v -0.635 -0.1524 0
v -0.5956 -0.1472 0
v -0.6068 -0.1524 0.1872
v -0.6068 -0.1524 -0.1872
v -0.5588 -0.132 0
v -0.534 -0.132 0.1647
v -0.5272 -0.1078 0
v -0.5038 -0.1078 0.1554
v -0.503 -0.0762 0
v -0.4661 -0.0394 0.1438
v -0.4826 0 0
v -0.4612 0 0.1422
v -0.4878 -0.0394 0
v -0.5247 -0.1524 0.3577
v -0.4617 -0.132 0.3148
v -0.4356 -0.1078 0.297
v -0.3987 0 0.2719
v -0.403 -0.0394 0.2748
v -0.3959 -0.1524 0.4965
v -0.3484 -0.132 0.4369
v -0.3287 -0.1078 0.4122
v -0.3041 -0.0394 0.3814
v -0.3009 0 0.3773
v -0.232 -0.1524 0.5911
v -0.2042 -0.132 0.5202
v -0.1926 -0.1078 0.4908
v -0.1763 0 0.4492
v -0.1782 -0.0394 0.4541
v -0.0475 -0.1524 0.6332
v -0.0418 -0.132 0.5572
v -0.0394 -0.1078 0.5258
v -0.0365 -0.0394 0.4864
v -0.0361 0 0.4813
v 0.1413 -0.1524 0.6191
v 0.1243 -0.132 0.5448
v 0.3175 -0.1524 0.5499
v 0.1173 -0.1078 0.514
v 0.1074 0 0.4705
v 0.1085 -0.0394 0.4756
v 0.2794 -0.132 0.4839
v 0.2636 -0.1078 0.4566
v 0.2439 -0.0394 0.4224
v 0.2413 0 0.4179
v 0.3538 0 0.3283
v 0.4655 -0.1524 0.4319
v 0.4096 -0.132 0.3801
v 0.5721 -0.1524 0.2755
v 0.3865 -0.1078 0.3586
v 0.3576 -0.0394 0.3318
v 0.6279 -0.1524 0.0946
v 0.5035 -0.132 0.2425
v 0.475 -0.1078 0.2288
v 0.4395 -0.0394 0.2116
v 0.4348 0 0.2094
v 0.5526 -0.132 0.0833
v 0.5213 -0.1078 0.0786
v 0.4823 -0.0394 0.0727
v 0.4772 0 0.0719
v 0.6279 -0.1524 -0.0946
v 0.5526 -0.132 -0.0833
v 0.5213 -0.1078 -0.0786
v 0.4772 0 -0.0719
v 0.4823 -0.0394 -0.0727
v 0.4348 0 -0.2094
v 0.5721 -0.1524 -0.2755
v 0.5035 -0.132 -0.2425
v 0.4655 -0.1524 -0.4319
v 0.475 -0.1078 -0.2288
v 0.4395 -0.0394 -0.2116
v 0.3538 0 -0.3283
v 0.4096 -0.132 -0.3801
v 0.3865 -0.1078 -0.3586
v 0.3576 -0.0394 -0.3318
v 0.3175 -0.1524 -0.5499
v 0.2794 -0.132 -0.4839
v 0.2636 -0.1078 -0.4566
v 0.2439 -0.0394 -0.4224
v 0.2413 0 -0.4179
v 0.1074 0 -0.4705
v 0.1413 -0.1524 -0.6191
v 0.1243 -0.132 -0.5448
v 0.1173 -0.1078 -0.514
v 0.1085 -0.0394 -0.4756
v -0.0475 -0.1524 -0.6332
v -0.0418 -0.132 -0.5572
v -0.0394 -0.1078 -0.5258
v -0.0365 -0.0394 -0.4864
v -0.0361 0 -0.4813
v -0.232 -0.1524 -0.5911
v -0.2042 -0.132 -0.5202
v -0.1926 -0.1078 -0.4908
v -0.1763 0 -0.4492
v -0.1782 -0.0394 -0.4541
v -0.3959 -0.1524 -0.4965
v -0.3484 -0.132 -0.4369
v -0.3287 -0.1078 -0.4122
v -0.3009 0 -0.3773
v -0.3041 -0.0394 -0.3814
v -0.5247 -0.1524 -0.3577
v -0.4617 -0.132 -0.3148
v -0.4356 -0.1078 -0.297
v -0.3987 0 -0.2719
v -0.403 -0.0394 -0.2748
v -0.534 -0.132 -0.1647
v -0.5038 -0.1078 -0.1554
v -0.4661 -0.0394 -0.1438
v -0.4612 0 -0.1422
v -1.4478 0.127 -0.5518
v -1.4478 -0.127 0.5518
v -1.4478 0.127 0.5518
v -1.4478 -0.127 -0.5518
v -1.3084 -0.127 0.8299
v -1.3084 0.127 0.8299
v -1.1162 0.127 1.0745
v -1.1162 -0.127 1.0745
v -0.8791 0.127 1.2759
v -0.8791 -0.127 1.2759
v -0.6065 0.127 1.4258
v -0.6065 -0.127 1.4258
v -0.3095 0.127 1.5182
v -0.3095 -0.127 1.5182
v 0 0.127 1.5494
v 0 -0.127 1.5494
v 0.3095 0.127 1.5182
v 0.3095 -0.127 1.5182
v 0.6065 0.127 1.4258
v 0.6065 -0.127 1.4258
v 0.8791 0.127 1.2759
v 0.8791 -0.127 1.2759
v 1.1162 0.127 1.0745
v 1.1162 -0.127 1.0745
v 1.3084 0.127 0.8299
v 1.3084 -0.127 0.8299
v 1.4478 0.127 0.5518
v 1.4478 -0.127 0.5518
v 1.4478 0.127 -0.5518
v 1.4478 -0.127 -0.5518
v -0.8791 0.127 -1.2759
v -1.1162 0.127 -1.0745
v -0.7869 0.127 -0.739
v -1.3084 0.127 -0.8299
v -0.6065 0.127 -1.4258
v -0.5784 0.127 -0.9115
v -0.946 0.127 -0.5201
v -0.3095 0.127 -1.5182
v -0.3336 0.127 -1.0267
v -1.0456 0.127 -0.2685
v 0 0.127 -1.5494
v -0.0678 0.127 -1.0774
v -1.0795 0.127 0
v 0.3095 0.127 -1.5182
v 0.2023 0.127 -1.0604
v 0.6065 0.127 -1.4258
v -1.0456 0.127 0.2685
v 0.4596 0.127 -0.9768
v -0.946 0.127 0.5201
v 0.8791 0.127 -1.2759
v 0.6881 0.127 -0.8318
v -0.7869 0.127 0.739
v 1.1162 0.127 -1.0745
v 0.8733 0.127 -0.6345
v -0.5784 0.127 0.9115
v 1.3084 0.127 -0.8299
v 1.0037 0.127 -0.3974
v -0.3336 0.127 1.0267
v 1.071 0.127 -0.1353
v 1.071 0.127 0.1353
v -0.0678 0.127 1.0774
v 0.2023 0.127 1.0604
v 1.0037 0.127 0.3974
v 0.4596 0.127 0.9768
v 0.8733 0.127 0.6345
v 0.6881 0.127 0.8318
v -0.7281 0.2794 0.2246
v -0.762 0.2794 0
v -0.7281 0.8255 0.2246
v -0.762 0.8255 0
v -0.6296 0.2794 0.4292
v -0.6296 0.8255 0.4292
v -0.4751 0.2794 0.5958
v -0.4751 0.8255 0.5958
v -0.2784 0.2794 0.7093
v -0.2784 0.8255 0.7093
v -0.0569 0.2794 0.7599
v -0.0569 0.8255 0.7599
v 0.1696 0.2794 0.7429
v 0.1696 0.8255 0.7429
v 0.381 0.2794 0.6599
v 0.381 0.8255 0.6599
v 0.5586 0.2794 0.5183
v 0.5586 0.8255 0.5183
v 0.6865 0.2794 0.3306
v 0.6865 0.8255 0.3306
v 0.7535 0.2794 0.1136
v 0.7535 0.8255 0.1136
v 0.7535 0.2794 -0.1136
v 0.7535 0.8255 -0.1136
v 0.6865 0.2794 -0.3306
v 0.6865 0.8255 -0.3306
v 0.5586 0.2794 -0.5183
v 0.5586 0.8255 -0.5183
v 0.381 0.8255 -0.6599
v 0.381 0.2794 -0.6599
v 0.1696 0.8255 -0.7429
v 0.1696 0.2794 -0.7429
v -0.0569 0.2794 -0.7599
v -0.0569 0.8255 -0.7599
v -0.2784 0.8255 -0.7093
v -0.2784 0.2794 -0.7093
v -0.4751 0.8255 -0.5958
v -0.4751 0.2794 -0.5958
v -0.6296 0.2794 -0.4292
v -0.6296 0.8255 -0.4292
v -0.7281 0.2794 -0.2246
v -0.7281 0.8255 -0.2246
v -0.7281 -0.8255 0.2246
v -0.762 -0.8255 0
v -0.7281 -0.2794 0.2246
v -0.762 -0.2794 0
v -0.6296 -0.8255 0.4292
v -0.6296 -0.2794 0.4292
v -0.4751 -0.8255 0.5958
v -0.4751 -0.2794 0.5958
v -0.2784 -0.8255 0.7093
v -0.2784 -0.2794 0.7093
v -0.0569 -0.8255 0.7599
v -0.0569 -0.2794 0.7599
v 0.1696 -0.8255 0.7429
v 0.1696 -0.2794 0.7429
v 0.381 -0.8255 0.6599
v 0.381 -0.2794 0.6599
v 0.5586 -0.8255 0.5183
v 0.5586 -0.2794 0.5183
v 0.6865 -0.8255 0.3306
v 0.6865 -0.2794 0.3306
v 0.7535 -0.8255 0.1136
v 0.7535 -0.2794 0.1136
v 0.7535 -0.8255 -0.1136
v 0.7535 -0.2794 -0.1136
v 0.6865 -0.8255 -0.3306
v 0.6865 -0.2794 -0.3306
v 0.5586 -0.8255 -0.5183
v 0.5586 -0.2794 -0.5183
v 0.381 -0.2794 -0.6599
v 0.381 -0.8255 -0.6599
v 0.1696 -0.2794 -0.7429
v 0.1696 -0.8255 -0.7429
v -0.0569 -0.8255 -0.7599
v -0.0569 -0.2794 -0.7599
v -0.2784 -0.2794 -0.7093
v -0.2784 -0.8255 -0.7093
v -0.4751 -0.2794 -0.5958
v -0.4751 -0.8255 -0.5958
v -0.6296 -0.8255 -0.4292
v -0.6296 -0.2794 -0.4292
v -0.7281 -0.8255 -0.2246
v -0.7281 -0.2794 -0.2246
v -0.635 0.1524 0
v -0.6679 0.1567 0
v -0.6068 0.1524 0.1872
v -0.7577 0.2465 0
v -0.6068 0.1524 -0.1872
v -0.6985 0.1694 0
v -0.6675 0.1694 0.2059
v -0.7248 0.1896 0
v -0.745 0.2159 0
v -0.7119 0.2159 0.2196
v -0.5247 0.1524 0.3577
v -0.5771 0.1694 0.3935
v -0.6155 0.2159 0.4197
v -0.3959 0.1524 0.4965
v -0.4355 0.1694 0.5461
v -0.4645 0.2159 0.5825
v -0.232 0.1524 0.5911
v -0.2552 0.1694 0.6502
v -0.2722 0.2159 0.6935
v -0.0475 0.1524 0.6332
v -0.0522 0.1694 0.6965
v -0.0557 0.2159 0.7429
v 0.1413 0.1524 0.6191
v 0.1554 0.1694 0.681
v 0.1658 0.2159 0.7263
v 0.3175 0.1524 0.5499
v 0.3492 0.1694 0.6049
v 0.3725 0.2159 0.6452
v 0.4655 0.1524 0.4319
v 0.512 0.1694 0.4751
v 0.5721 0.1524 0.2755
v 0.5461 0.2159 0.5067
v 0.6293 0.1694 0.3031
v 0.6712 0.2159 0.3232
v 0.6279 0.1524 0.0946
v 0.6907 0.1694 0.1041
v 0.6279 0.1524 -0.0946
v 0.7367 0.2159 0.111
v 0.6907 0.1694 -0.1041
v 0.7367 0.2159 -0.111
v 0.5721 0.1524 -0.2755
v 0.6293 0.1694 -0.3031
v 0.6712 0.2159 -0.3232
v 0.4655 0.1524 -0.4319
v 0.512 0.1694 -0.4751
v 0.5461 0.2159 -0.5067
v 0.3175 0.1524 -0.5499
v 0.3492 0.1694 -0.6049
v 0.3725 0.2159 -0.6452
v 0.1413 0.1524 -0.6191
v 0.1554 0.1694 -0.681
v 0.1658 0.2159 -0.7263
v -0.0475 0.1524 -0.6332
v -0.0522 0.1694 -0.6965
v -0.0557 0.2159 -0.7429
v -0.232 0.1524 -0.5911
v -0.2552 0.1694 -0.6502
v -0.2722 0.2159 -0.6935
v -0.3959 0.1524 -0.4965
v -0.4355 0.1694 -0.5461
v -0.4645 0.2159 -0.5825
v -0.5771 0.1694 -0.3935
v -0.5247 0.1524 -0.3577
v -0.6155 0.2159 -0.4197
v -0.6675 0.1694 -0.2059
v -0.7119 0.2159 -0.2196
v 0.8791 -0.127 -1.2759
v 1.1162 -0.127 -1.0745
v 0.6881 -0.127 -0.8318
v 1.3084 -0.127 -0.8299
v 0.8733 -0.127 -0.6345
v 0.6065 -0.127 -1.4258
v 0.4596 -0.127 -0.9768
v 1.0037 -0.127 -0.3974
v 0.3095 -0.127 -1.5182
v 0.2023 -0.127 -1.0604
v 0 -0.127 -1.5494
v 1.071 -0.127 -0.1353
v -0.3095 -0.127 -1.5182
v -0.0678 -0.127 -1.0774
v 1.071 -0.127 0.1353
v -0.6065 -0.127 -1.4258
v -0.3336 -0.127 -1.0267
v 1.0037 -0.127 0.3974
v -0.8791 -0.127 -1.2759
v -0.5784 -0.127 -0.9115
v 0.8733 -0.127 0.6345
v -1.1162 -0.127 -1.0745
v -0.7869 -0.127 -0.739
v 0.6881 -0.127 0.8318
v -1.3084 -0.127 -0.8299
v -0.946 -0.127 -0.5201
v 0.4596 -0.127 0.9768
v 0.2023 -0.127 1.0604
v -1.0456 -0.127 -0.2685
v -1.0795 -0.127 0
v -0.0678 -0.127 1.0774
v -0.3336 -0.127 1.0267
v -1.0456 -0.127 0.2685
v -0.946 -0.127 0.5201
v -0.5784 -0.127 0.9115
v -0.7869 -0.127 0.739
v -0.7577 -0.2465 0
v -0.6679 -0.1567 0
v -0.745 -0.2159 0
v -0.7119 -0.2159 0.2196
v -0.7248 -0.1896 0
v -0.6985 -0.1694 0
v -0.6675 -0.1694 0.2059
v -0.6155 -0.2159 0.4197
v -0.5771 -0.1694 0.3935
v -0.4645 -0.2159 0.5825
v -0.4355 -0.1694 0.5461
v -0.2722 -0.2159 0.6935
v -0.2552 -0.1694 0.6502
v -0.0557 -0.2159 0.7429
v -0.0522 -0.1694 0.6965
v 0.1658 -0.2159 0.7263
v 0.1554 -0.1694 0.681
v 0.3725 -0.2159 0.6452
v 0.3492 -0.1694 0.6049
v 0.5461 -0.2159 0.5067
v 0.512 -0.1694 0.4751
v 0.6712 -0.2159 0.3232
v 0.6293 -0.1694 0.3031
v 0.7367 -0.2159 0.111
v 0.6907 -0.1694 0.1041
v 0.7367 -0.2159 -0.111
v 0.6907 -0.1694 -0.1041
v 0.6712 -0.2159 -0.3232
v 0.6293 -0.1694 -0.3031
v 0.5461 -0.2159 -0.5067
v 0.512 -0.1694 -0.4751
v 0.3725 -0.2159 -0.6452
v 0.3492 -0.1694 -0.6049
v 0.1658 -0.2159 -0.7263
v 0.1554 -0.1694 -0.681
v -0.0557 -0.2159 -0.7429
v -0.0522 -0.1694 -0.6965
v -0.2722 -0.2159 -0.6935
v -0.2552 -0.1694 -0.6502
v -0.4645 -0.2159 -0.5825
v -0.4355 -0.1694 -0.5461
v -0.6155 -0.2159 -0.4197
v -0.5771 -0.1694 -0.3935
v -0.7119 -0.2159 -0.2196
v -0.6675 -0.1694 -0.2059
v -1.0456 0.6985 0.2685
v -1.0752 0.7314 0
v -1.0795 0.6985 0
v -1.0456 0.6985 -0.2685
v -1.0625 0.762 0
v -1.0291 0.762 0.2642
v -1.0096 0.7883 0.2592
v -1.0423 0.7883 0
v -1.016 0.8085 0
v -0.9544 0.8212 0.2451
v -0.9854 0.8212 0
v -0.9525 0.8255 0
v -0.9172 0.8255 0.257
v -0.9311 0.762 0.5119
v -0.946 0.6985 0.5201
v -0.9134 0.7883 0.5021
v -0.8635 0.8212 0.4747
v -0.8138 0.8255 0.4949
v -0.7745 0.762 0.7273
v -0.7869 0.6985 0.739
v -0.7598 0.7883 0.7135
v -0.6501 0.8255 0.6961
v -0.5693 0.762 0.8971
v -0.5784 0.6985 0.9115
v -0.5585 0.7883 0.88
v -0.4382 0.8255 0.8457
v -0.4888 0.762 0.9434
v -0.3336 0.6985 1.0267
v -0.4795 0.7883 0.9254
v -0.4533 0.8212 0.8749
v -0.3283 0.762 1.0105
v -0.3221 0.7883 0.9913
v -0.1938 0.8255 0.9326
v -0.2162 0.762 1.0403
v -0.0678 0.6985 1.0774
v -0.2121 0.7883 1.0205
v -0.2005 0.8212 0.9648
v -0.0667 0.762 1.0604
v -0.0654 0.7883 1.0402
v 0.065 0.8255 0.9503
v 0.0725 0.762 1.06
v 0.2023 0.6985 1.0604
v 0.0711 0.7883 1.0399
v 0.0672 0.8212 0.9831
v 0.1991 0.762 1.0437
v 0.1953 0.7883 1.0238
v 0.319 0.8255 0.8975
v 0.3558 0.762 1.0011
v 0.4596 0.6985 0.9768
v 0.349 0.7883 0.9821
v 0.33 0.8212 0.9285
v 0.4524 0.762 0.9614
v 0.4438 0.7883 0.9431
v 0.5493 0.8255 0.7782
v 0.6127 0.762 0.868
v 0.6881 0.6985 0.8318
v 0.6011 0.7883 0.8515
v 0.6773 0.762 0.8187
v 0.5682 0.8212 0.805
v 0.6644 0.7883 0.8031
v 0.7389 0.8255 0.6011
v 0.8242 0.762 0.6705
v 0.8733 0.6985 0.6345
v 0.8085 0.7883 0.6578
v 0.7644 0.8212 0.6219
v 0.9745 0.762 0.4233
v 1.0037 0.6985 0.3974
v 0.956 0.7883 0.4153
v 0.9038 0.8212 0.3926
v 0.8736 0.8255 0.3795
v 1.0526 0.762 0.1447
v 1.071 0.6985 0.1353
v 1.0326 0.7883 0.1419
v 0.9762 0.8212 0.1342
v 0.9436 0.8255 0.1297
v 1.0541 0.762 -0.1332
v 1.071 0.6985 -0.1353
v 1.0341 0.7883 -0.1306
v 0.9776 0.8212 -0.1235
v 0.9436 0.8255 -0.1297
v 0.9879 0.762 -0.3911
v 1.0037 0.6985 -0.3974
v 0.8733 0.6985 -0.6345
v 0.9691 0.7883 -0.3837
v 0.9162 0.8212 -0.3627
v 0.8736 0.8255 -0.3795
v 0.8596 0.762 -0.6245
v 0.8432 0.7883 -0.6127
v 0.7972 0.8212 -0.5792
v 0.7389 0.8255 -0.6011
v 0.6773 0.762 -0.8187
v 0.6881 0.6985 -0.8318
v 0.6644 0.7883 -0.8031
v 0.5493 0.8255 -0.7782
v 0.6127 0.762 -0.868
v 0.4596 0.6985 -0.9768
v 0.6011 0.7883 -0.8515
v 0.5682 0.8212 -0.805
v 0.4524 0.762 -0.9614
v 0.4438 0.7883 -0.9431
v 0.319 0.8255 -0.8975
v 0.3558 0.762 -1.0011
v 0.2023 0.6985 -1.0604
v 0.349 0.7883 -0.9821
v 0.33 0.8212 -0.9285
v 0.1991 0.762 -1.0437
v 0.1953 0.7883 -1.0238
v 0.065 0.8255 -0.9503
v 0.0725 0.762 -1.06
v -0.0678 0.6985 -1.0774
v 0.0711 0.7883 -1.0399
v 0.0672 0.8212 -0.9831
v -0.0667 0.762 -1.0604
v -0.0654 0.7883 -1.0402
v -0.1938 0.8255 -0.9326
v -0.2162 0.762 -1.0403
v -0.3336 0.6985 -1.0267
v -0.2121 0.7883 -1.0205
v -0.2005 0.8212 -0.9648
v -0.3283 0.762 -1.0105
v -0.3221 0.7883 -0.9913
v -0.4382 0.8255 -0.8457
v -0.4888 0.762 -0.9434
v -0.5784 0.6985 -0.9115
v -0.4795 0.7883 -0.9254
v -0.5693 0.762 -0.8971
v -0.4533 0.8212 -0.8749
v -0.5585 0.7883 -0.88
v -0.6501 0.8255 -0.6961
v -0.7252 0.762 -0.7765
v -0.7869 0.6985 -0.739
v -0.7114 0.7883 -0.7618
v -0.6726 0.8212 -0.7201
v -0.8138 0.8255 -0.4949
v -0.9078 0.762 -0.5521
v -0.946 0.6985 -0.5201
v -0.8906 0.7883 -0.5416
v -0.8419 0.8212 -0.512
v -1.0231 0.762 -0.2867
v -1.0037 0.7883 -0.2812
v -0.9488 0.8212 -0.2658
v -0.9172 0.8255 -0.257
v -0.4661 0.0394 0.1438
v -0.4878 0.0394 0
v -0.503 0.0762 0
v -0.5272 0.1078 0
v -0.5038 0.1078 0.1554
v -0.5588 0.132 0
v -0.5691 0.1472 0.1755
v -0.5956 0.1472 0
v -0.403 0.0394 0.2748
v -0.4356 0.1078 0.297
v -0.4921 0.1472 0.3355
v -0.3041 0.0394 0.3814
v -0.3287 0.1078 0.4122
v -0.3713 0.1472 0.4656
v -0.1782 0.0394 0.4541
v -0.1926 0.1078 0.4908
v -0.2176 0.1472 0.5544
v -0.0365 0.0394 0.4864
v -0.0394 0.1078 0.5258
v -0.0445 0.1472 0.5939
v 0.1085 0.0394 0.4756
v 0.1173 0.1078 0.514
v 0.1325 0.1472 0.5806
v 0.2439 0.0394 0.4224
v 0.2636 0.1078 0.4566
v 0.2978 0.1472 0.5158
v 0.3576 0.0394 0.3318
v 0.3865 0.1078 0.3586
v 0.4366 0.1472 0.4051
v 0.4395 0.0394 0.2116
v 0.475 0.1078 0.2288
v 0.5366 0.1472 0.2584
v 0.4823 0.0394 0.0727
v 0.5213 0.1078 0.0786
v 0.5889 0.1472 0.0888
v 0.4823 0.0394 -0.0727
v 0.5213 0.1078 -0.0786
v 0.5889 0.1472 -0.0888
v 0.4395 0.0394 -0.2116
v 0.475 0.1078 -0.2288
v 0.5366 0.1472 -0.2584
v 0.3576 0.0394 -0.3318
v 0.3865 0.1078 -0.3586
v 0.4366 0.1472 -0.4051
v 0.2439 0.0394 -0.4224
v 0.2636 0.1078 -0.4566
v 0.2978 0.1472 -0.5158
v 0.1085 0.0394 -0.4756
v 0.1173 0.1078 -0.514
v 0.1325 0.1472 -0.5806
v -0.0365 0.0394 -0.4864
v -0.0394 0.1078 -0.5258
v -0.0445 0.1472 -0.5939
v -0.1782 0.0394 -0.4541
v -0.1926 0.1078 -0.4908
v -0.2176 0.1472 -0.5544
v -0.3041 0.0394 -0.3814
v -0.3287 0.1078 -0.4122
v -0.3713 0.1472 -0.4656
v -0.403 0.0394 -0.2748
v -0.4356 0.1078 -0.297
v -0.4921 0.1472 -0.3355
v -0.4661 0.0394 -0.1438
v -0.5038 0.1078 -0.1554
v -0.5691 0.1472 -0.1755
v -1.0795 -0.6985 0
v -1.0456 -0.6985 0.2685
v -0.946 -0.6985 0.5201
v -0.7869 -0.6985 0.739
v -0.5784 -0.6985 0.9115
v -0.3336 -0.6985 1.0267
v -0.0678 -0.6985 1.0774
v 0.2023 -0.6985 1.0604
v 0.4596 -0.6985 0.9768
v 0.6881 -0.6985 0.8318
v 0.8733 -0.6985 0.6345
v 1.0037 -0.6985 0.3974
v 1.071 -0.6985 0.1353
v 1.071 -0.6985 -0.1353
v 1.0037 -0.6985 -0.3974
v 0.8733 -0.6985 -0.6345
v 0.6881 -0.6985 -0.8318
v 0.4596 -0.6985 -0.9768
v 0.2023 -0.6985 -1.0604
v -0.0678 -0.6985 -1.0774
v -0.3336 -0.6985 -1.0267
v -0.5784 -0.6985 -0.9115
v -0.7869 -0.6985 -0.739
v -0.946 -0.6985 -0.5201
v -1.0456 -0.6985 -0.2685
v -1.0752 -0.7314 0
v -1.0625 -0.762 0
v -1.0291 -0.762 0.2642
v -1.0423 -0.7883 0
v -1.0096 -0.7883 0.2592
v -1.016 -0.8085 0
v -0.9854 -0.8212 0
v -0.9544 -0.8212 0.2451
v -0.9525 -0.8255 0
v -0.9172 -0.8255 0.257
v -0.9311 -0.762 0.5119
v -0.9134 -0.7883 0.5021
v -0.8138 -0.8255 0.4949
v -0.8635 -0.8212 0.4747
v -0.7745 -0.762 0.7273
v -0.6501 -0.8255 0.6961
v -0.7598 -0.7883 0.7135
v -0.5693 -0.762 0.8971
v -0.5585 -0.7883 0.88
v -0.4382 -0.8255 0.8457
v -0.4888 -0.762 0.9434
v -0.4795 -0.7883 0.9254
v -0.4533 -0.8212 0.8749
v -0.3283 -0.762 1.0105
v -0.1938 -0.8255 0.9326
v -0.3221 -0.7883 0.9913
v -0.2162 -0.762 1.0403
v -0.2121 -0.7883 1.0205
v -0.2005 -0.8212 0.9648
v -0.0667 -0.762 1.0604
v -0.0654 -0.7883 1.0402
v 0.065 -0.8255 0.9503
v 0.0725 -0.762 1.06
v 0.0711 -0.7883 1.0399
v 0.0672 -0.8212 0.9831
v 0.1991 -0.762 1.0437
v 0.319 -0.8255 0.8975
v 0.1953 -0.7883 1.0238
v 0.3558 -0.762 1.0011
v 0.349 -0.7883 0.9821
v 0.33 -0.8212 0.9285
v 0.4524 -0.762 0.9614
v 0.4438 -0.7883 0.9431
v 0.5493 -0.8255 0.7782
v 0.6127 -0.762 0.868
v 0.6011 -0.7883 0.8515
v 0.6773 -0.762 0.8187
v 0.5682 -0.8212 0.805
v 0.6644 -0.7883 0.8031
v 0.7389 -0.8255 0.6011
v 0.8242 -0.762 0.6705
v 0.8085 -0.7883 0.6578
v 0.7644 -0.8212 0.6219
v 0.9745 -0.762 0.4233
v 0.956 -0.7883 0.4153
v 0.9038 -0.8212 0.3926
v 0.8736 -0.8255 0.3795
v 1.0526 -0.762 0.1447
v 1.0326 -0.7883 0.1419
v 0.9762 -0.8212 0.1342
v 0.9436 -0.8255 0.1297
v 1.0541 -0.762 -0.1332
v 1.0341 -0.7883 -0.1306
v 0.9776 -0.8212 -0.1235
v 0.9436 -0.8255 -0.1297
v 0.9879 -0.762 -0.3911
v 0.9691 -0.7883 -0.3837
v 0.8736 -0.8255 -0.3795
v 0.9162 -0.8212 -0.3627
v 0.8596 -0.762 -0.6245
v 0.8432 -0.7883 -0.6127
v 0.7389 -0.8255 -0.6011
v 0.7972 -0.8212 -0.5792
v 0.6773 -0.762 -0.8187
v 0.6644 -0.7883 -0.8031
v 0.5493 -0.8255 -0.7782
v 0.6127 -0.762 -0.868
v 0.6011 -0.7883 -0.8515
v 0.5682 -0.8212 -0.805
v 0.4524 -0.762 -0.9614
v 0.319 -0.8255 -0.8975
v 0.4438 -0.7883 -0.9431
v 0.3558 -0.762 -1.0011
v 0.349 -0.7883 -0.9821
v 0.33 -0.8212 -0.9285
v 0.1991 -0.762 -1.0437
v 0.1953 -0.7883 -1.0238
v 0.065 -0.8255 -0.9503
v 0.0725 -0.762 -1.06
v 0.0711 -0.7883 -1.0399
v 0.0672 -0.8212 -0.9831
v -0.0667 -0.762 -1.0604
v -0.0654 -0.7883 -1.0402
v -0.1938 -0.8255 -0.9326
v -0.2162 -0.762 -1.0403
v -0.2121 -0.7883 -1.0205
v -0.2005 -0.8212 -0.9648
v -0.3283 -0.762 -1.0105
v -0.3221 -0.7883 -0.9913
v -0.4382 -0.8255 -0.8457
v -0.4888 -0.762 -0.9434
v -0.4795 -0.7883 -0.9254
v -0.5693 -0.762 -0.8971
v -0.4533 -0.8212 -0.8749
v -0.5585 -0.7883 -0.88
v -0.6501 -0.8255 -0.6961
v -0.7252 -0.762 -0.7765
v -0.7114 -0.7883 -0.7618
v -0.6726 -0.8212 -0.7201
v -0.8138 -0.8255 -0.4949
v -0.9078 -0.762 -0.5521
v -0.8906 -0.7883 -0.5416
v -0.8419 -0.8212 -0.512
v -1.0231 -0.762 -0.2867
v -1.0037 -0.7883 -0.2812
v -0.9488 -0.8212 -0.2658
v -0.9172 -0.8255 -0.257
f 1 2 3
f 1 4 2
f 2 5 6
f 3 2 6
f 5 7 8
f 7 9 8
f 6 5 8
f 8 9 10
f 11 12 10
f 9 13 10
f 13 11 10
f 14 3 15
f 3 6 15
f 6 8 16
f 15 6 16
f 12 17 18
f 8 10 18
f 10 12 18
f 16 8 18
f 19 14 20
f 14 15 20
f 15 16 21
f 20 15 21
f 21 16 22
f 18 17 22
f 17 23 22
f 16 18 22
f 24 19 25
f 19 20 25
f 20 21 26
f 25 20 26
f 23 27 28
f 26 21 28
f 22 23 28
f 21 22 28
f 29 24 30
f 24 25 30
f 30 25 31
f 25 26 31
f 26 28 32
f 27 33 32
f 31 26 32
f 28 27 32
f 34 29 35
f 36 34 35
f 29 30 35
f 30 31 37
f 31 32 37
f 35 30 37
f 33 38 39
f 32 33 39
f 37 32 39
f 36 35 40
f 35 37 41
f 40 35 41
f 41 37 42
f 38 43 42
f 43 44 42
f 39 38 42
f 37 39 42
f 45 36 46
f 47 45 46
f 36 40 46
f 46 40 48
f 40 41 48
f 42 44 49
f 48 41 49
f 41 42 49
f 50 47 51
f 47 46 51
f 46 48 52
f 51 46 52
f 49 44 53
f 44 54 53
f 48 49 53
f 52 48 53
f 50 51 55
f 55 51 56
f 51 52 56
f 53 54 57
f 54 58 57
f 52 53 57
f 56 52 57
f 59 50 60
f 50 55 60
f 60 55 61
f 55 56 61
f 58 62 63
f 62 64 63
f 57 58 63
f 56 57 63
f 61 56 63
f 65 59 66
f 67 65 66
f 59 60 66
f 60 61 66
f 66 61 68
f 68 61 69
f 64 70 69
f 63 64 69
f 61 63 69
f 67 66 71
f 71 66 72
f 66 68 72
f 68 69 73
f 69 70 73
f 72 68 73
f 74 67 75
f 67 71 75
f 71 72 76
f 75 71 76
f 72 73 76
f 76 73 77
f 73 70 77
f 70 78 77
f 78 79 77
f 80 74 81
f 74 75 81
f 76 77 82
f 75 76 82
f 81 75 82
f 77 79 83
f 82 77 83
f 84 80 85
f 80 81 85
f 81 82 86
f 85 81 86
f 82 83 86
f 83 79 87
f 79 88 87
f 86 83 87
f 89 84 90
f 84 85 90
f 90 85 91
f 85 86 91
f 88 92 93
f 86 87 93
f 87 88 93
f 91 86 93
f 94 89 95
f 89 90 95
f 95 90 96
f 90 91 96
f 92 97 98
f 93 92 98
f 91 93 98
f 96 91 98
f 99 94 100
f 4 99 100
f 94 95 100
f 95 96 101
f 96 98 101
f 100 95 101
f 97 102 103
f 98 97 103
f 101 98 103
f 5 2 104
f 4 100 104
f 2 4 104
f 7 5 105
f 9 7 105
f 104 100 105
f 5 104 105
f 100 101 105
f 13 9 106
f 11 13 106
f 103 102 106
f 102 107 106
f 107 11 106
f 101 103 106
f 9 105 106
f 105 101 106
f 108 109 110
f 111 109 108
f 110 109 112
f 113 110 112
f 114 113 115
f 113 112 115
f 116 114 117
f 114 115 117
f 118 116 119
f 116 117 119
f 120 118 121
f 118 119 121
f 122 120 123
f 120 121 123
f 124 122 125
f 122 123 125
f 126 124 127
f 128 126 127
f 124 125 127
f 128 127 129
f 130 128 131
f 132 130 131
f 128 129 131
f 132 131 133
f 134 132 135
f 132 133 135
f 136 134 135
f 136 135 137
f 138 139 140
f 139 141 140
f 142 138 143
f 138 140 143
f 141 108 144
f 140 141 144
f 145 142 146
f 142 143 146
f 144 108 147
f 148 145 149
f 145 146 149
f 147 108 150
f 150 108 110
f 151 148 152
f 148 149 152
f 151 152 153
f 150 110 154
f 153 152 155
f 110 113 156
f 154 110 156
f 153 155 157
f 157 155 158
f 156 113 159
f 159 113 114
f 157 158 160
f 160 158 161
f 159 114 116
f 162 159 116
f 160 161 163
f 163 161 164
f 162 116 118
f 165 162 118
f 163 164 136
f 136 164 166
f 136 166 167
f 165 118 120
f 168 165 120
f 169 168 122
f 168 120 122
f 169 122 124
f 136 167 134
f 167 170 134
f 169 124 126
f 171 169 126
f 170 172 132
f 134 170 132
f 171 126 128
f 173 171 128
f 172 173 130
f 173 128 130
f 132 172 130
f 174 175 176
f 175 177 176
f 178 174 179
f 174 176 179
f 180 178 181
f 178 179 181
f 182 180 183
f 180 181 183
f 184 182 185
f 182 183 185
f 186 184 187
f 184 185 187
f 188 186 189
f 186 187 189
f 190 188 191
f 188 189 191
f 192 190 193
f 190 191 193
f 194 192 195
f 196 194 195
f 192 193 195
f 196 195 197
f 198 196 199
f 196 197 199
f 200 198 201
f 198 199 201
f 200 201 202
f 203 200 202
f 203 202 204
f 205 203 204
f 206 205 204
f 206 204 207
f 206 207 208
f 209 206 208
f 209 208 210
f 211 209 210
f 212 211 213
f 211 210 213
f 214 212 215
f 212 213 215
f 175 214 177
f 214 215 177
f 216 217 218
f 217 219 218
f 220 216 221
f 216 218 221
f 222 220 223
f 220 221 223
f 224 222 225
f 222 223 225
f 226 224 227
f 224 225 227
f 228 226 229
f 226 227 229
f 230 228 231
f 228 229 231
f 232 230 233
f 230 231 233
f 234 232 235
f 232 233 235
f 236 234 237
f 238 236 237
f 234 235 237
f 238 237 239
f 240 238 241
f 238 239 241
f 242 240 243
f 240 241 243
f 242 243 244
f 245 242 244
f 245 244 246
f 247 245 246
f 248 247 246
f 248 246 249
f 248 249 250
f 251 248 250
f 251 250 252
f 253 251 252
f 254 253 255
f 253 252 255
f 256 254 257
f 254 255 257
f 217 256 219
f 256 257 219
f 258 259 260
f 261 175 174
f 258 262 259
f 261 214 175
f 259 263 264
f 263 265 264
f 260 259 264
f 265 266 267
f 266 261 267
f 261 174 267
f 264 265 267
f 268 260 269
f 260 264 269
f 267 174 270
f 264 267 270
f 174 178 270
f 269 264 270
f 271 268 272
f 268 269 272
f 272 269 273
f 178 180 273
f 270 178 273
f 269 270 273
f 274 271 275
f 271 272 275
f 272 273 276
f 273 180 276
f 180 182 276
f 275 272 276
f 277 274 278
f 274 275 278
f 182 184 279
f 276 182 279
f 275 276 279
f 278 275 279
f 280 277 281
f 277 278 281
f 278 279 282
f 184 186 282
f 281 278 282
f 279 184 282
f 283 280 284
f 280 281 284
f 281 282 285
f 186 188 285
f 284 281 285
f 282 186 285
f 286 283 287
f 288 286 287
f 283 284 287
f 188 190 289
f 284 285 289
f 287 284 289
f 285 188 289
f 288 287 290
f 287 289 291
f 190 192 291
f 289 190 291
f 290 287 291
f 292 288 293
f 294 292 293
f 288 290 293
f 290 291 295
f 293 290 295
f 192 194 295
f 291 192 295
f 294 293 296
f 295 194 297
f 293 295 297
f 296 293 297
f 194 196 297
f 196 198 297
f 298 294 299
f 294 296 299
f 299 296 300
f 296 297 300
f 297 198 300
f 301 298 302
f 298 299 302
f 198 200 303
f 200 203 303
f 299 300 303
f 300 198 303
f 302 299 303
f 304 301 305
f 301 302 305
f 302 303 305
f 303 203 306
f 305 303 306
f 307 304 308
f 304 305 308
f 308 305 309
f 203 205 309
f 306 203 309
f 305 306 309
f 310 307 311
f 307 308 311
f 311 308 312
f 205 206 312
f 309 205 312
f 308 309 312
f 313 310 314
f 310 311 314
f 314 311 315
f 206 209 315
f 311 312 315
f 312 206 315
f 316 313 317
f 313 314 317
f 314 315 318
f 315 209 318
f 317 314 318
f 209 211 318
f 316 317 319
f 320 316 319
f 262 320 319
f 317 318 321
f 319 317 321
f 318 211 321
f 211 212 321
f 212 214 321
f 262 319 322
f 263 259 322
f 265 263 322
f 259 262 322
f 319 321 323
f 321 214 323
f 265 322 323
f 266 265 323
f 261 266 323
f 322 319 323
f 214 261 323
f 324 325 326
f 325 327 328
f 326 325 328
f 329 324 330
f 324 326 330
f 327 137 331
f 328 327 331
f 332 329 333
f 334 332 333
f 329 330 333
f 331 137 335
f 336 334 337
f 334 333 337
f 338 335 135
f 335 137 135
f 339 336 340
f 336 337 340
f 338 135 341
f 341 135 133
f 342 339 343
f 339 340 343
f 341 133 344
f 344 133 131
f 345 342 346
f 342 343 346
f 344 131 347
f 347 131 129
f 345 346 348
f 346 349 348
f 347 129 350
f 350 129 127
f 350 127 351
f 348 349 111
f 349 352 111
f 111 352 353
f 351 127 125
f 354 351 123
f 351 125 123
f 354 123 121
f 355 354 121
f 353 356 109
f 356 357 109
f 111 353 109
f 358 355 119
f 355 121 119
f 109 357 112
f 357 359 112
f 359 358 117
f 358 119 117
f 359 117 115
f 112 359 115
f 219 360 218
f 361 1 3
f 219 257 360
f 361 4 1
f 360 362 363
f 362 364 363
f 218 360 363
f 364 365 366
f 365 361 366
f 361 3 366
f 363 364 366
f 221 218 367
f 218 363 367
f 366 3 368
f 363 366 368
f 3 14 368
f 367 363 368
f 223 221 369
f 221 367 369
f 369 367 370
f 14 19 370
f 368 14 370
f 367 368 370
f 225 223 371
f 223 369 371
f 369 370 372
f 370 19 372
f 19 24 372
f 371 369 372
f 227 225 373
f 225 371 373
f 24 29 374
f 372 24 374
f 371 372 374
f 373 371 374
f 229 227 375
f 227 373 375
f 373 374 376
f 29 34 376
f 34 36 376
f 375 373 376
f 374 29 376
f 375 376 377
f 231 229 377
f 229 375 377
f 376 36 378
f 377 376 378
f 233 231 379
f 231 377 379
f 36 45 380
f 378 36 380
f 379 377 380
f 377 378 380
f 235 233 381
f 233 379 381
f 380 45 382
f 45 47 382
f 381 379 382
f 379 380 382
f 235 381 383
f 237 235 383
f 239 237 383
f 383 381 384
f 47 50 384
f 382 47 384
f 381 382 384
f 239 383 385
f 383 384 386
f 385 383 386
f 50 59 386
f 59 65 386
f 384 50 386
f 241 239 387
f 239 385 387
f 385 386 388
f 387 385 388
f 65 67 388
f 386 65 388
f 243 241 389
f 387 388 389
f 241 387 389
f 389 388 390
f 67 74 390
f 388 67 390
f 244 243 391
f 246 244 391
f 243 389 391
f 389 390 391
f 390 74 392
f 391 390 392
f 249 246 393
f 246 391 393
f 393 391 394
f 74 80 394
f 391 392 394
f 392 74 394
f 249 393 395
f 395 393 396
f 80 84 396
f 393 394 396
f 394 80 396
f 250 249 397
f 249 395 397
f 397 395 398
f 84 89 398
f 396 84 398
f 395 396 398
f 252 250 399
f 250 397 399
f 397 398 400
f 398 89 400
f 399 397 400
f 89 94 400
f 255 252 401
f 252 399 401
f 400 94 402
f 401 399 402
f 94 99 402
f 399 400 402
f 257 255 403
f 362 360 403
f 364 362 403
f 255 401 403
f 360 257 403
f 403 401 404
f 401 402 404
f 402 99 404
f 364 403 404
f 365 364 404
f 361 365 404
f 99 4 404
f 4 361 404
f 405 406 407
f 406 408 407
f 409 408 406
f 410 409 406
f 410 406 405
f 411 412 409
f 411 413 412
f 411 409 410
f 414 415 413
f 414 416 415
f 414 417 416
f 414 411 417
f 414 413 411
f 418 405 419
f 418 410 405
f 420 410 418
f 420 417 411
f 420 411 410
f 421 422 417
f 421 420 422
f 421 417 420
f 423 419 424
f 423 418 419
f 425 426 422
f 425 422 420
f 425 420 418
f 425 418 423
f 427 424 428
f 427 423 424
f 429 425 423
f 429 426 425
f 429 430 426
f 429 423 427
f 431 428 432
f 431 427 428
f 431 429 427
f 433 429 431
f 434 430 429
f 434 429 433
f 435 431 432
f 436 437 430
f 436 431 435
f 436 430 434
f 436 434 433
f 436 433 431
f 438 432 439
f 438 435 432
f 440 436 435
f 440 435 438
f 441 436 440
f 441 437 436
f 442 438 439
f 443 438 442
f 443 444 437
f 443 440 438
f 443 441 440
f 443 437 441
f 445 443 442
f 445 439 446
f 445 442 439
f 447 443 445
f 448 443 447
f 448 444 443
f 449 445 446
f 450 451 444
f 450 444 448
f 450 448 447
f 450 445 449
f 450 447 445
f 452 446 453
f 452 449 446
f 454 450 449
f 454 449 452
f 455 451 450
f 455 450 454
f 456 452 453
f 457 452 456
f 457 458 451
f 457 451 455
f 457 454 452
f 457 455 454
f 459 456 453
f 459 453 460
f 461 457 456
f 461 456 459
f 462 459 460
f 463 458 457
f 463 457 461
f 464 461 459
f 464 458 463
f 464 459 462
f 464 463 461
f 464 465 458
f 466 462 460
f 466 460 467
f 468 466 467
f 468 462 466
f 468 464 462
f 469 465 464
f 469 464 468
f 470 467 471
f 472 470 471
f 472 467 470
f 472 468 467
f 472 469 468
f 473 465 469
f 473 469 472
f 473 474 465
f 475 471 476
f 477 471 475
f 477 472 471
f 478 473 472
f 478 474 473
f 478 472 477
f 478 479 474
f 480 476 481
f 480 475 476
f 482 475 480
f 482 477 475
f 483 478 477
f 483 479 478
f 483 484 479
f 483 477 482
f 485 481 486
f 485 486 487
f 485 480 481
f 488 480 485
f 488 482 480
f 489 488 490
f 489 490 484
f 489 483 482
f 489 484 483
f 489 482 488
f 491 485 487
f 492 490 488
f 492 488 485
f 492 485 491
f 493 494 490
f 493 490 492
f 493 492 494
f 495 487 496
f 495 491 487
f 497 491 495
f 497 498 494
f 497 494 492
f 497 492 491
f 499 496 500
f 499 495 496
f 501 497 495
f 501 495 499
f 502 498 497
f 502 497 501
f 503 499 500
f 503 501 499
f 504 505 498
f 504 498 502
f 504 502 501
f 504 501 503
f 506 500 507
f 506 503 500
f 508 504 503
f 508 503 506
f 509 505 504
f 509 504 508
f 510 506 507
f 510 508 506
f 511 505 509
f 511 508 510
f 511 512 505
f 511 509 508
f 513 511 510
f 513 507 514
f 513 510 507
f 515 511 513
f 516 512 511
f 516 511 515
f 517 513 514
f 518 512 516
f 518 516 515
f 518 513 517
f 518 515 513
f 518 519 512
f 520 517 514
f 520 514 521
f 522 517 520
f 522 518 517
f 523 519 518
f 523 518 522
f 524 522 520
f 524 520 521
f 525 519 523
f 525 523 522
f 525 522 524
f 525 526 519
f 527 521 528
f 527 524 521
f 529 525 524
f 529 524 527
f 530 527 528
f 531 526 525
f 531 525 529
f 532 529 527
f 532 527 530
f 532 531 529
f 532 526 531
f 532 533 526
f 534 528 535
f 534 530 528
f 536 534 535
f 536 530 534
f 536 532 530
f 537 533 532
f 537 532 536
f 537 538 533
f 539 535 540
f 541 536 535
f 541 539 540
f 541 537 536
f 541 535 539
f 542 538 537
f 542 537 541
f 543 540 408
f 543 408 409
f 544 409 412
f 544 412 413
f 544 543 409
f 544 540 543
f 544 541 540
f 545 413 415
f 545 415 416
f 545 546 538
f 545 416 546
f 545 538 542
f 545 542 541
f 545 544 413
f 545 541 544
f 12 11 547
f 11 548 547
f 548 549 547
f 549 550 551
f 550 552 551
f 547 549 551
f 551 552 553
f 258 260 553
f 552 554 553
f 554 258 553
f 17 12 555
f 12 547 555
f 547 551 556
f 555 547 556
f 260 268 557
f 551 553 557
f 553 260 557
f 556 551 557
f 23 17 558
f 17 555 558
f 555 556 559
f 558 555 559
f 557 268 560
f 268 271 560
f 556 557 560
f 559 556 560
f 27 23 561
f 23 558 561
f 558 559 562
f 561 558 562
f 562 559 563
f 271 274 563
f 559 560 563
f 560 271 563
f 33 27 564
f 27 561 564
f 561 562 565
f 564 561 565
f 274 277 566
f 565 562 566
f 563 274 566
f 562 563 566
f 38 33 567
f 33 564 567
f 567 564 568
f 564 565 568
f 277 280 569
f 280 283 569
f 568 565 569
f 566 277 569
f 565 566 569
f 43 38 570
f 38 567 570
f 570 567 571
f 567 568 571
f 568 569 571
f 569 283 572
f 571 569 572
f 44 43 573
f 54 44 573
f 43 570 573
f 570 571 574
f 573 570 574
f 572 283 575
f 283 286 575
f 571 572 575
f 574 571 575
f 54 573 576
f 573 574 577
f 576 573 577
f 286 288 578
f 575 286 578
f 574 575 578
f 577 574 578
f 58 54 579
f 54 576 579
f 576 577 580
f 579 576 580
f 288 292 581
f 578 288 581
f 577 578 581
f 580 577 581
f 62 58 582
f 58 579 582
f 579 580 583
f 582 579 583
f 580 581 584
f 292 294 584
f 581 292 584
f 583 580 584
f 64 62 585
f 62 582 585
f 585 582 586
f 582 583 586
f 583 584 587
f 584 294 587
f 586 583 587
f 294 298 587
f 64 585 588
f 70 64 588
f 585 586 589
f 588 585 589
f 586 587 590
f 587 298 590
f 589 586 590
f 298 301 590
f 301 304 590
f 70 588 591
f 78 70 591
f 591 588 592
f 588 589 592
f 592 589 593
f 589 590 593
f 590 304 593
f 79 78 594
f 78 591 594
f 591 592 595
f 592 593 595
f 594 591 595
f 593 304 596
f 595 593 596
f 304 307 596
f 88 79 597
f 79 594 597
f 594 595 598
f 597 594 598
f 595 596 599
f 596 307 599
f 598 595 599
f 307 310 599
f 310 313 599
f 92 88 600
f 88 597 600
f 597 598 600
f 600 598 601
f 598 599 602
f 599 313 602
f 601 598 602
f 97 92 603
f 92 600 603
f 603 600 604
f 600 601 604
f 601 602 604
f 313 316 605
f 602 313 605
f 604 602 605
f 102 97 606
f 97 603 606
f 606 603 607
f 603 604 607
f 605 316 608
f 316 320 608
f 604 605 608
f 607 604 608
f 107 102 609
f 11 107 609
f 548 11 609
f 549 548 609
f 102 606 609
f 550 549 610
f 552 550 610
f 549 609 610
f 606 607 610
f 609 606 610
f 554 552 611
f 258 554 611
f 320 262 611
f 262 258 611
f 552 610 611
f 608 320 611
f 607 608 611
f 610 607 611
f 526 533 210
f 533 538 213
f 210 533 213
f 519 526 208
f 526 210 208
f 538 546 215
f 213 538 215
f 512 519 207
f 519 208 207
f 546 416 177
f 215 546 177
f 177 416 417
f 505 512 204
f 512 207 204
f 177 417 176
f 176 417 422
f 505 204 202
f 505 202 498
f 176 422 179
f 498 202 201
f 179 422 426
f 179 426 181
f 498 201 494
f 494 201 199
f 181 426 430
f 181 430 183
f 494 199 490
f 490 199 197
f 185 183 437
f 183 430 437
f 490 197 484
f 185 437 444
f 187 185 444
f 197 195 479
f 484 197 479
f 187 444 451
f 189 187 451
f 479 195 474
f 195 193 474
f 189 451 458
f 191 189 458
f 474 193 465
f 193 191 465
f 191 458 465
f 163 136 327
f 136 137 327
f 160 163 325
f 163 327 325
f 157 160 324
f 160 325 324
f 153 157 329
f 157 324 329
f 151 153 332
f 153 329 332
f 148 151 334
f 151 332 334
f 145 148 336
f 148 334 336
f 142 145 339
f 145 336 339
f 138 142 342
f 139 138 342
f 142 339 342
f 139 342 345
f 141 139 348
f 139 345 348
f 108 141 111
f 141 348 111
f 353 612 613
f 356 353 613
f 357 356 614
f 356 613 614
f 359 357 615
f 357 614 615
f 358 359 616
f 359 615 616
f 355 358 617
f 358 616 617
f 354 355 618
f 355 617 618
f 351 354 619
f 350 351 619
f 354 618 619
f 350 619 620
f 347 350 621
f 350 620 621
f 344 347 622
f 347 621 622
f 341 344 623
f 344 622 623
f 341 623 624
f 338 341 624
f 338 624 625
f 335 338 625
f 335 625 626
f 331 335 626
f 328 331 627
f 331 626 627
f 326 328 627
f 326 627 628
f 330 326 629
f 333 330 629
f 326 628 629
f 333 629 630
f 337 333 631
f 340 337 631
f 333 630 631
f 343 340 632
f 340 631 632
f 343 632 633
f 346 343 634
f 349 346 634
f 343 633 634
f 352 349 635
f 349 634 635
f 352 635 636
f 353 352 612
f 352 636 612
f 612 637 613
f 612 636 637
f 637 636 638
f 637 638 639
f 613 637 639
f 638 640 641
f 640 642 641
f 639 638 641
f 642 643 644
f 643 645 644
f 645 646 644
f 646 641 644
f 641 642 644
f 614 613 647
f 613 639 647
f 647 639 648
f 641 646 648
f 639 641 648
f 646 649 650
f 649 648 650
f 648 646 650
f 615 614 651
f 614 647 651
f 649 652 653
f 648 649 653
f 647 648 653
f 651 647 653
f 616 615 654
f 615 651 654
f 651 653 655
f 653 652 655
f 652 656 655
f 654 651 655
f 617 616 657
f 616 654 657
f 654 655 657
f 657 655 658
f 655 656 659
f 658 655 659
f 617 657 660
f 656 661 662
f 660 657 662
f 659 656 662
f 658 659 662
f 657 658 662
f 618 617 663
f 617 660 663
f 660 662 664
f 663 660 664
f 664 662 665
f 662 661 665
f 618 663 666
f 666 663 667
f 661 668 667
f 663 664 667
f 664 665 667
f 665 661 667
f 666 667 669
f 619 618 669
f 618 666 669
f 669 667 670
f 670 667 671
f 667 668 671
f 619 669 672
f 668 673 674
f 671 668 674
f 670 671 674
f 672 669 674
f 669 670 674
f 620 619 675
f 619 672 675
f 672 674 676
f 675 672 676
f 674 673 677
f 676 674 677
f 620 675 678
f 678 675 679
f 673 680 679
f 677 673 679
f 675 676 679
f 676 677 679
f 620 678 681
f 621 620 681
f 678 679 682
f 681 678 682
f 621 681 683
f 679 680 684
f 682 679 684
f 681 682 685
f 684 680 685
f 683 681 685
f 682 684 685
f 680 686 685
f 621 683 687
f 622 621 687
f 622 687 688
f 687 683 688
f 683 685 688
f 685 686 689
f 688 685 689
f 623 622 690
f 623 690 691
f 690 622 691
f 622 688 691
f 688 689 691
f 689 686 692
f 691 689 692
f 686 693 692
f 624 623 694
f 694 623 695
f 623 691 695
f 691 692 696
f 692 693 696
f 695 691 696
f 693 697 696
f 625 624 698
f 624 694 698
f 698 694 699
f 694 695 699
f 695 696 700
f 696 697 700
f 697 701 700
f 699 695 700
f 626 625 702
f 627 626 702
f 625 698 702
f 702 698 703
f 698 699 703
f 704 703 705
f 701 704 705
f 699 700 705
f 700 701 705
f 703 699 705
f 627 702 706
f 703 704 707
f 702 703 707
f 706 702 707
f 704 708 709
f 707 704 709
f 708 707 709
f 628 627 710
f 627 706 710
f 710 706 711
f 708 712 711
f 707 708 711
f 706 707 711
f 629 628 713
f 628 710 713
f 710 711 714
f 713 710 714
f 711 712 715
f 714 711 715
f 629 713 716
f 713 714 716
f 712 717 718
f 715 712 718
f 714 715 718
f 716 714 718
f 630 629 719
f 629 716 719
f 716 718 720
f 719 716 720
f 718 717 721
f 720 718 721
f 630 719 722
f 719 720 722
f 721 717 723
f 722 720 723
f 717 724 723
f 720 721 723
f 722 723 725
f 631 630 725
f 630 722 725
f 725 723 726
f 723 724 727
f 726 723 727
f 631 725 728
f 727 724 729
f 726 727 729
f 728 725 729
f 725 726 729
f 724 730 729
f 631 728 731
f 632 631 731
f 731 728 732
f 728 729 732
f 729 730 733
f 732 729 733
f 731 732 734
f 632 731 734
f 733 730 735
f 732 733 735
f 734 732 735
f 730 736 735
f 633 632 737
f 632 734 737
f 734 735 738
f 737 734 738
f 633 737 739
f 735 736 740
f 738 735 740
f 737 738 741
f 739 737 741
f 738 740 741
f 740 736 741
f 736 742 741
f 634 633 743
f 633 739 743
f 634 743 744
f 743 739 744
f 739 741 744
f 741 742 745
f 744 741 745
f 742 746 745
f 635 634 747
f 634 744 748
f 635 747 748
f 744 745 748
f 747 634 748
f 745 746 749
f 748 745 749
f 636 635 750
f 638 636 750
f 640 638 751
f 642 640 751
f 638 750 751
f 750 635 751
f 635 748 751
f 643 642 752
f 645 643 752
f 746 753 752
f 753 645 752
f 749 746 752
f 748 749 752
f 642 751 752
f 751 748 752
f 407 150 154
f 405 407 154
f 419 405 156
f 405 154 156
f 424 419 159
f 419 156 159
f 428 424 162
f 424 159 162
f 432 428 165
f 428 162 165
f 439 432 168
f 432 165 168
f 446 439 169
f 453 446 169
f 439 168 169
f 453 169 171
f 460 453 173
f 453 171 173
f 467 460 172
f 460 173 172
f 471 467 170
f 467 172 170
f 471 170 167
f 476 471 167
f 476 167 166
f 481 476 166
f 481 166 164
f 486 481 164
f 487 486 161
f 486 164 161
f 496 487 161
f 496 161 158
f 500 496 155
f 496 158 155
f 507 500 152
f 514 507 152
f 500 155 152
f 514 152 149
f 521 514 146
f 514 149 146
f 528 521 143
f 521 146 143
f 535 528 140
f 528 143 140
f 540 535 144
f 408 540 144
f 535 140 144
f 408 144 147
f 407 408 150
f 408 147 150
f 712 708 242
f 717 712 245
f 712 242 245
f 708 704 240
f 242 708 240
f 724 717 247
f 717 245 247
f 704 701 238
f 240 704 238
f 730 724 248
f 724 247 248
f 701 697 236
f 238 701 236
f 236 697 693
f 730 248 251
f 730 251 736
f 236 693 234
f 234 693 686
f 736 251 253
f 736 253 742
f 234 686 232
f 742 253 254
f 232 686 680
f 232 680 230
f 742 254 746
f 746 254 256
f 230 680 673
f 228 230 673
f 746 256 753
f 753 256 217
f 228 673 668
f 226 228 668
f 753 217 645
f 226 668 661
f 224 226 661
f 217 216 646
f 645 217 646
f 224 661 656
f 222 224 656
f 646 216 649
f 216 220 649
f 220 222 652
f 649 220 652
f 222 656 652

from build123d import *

# Parameters (mm, degrees)
FILLET1_R          = 0.127
SKETCH2_W          = 1.656655401
SKETCH2_H          = 3.010652604
CUT_EXTRUDE1_DEPTH = 1.27


with BuildPart() as part:
    # Sketch1 → Revolve1 (revolve)
    with BuildSketch(Plane.XY):
        with BuildLine():
            Line((-1.0795, 0.8255), (-1.0795, 0.127))
            Line((-1.0795, 0.127), (-1.5494, 0.127))
            Line((-1.5494, 0.127), (-1.5494, -0.127))
            Line((-1.5494, -0.127), (-1.0795, -0.127))
            Line((-1.0795, -0.127), (-1.0795, -0.8255))
            Line((-1.0795, -0.8255), (-0.762, -0.8255))
            Line((-0.762, -0.8255), (-0.762, -0.2794))
            ThreePointArc((-0.762, -0.2794), (-0.724802561, -0.189597439), (-0.635, -0.1524))
            ThreePointArc((-0.635, -0.1524), (-0.527236927, -0.107763073), (-0.4826, 0))
            ThreePointArc((-0.4826, 0), (-0.527236927, 0.107763073), (-0.635, 0.1524))
            ThreePointArc((-0.635, 0.1524), (-0.724802561, 0.189597439), (-0.762, 0.2794))
            Line((-0.762, 0.2794), (-0.762, 0.8255))
            Line((-0.762, 0.8255), (-1.0795, 0.8255))
        make_face()
    revolve(axis=Axis((0, 0, 0), (0, 1, 0)))

    # Fillet1
    fillet1_edges = [part.edges().sort_by_distance(p)[0] for p in [
        (1.0795, -0.8255, 0),
        (1.0795, 0.8255, 0),
    ]]
    fillet(fillet1_edges, radius=FILLET1_R)

    # Sketch2 → Cut-Extrude1 (cut, symmetric)
    with BuildSketch(Plane(origin=(0, 0, 0), x_dir=(1, 0, 0), z_dir=(0, 1, 0))):
        with Locations((-2.276127701, -0.051770481)):
            Rectangle(SKETCH2_W, SKETCH2_H)
        with Locations((2.276127701, -0.051770481)):
            Rectangle(SKETCH2_W, SKETCH2_H)
    extrude(amount=CUT_EXTRUDE1_DEPTH, both=True, mode=Mode.SUBTRACT)


solid = part.part
